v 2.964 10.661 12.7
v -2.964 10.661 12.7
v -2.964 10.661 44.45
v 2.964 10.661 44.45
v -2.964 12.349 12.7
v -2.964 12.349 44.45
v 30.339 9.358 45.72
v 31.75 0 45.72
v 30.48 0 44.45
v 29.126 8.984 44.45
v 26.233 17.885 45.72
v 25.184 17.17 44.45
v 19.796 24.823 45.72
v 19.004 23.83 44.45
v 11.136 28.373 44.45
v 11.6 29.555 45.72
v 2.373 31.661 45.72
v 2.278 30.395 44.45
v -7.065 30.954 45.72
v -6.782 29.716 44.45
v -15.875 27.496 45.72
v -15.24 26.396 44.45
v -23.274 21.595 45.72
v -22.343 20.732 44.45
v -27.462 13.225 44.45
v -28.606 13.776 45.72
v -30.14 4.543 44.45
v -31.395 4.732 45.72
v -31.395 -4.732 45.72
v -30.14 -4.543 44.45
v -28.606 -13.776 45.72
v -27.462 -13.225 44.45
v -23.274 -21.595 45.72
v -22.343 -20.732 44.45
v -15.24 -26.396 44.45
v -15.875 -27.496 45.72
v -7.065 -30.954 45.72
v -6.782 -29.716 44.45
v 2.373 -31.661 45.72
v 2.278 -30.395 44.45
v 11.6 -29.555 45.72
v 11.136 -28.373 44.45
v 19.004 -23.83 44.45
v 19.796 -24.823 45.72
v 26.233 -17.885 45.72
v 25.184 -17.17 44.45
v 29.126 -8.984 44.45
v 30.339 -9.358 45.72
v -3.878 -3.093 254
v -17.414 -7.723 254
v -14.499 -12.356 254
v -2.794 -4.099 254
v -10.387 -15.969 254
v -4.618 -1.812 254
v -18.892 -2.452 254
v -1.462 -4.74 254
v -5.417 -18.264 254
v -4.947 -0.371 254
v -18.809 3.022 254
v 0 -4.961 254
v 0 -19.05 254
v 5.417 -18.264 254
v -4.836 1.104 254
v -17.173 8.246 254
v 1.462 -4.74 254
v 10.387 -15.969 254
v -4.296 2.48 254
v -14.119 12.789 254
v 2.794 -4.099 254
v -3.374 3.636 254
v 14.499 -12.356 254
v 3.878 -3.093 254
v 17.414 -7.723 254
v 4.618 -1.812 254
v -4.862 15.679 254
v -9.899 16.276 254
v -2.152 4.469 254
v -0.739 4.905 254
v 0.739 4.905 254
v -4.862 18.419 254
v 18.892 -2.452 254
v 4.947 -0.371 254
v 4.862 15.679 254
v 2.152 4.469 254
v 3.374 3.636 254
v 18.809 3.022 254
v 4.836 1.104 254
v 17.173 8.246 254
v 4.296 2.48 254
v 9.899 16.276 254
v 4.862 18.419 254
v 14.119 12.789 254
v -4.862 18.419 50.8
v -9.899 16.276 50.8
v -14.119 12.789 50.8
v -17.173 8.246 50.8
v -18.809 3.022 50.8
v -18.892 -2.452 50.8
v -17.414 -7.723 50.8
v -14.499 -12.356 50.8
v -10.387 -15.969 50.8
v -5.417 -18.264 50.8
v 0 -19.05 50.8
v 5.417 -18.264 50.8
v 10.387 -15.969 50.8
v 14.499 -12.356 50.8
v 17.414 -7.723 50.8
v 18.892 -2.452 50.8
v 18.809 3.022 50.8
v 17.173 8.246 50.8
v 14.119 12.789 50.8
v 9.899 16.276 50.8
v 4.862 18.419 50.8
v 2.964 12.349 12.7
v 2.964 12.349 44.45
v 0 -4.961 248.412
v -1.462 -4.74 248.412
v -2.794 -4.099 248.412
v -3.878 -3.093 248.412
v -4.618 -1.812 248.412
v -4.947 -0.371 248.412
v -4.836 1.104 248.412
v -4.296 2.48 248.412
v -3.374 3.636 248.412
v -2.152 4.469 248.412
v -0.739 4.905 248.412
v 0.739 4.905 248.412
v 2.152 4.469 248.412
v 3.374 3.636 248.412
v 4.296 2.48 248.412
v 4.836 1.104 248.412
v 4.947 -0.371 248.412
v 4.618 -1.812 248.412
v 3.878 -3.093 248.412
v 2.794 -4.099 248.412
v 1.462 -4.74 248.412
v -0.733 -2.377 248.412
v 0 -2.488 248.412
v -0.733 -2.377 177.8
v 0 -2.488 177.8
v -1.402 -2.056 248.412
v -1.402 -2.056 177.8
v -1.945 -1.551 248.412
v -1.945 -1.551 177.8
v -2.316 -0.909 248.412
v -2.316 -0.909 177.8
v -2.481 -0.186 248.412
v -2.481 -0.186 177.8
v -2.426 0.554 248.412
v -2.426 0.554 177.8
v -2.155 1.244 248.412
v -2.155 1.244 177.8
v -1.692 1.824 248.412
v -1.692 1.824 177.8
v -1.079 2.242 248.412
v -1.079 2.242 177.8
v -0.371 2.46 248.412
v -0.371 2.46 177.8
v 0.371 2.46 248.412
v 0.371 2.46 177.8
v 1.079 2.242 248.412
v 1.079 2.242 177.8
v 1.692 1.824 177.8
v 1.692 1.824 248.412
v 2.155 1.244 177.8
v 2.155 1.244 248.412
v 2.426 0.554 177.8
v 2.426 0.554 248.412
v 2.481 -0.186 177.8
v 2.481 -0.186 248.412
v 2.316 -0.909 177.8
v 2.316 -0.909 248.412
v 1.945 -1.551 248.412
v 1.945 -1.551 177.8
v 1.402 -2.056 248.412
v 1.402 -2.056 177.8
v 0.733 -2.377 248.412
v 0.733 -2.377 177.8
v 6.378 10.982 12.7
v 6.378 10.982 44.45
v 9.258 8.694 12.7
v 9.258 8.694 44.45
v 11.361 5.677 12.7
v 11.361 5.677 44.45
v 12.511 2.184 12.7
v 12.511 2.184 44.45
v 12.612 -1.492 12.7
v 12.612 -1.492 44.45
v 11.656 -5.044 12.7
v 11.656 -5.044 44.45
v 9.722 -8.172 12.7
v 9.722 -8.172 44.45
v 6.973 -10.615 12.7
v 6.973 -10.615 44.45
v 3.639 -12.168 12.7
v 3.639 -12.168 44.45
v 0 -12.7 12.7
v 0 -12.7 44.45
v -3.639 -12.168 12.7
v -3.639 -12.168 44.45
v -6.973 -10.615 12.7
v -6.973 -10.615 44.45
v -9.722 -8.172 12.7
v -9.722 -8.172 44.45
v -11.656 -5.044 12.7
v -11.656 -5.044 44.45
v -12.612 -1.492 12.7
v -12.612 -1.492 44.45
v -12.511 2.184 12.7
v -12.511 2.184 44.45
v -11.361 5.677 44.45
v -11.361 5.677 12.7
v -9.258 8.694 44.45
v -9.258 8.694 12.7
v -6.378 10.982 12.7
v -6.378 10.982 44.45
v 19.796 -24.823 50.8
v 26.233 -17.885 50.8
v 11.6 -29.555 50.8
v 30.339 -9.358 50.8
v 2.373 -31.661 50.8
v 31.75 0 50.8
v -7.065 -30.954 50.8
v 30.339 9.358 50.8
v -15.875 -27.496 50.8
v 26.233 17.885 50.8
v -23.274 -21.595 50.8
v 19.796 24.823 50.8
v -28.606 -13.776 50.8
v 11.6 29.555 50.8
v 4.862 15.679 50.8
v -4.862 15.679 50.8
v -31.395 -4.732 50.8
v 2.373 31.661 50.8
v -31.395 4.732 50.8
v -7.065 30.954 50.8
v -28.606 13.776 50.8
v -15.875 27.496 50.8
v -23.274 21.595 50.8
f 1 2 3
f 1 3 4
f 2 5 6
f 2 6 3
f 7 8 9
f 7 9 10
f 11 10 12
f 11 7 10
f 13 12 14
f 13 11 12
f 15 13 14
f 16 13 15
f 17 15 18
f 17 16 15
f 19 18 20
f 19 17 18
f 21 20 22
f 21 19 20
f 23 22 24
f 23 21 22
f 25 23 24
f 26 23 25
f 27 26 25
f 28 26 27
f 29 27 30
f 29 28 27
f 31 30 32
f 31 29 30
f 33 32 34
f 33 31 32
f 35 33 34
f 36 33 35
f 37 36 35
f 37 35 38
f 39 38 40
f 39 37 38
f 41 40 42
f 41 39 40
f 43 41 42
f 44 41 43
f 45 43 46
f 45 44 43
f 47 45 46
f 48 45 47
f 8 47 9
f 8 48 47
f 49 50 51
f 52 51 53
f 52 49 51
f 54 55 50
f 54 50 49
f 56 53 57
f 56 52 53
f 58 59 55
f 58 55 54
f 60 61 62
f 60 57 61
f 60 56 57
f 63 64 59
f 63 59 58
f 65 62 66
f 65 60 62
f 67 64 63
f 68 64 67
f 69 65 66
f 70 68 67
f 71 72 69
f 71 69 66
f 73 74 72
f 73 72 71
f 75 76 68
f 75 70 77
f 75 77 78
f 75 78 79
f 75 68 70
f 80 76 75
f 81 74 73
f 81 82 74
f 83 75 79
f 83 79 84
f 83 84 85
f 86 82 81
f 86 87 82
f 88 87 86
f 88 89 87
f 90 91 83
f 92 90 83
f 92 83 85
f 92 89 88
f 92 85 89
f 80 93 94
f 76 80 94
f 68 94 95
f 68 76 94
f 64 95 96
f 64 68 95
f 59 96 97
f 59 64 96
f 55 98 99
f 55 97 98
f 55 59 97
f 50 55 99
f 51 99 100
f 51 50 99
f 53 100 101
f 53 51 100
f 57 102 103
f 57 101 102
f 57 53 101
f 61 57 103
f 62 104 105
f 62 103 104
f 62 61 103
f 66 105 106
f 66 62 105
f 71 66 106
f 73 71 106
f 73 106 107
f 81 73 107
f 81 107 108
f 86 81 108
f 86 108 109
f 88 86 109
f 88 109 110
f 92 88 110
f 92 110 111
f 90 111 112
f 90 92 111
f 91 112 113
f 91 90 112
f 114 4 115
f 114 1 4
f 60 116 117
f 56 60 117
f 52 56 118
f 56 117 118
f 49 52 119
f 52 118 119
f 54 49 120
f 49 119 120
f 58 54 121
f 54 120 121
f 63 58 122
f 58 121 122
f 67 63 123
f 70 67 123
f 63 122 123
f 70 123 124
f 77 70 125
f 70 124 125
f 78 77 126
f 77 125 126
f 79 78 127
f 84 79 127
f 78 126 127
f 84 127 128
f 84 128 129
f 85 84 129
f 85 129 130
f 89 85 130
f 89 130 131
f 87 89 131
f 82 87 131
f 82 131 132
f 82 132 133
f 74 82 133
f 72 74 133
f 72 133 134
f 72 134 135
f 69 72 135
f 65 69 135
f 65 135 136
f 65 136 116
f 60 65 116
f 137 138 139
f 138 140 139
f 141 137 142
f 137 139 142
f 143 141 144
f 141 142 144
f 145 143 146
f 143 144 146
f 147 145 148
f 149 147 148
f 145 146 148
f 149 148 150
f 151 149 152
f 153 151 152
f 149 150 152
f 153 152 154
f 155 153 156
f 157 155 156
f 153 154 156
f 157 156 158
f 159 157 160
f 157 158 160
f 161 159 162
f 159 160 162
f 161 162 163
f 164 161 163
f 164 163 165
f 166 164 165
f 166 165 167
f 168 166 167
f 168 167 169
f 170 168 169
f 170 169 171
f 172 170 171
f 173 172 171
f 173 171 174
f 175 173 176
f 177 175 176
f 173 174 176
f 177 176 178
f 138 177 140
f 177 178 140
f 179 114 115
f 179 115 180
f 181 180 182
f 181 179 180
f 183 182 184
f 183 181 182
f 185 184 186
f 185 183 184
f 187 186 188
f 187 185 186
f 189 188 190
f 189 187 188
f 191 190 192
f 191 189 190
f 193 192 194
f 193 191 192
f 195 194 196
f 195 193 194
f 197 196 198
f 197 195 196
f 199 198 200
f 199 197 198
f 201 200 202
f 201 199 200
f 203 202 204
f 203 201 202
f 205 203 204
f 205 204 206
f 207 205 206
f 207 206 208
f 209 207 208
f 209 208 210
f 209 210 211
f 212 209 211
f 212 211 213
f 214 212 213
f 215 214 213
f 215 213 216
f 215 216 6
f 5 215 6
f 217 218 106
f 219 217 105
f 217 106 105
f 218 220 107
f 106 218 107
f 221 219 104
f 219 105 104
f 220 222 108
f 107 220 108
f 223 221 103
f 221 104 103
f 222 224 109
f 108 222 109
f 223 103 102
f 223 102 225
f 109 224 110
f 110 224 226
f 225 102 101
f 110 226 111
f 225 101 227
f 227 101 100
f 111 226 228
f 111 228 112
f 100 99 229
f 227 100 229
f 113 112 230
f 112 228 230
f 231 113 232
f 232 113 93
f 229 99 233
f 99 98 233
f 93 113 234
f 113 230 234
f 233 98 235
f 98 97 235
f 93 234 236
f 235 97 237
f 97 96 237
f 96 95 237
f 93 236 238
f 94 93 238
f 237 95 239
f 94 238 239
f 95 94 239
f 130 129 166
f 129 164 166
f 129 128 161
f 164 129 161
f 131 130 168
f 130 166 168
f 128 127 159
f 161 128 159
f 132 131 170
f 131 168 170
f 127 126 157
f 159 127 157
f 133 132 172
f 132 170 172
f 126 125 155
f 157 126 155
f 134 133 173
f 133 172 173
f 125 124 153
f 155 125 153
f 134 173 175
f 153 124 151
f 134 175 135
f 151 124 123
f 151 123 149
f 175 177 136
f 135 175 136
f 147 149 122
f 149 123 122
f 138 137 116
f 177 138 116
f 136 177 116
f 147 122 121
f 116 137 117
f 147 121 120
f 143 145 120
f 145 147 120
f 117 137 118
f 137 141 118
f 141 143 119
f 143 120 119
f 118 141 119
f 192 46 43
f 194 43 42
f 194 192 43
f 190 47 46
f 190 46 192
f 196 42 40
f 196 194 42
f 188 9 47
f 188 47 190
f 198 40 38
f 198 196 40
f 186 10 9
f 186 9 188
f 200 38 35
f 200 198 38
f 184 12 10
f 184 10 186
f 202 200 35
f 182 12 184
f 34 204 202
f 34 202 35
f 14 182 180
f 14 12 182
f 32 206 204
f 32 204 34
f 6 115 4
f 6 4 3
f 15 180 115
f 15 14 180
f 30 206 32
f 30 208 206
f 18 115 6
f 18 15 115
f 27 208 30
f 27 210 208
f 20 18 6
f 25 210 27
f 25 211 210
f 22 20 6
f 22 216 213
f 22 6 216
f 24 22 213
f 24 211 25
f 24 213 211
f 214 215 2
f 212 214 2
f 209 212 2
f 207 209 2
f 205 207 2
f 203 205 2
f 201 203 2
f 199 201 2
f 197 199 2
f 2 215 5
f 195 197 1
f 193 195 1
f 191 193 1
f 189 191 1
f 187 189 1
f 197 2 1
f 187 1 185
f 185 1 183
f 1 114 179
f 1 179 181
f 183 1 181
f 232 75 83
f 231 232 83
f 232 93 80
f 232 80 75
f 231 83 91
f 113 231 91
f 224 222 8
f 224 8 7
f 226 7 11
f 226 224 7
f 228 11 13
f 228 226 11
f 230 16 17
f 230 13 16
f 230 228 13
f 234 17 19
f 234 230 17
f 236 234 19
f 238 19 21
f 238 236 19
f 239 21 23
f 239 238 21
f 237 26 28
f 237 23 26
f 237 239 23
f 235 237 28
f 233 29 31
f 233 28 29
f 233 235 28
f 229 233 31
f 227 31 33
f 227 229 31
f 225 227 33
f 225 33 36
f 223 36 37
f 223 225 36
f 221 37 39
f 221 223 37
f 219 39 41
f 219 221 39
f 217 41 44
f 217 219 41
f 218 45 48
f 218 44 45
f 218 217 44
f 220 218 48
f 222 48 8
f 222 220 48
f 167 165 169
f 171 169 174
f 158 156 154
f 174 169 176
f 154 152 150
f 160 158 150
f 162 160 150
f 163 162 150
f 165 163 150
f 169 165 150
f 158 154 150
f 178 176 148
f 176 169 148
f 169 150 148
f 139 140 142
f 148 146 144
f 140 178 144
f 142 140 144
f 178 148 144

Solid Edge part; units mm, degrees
sketch "Sketch1" plane through (0, 0, 0) normal (0, 0, 1) x (1, 0, 0)
  circle A0 centre (0, 0) radius 12.7
extrude "Protrusion1" add sketch "Sketch1" along normal blind 254
sketch "Sketch2" plane through (0, 0, 254) normal (0, 0, 1) x (1, 0, 0)
  circle A0 centre (0, 0) radius 19.05
extrude "ExtrudedProtrusion_2" add sketch "Sketch2" against normal blind 203.2
sketch "Sketch3" plane through (0, 0, 0) normal (0, 0, -1) x (-1, 0, 0)
  line L0 (-2.9642, 14.7392) -> (2.9642, 14.7392)
  line L1 (2.9642, 14.7392) -> (2.9642, 10.6608)
  line L2 (2.9642, 10.6608) -> (-2.9642, 10.6608)
  line L3 (-2.9642, 10.6608) -> (-2.9642, 14.7392)
extrude "ExtrudedCutout_1" cut sketch "Sketch3" against normal blind 50.8
sketch "Sketch4" plane through (0, 0, 50.8) normal (0, 0, -1) x (-1, 0, 0)
  line L0 (-4.8624, 22.4209) -> (4.8624, 22.4209)
  line L1 (4.8624, 22.4209) -> (4.8624, 15.6791)
  line L2 (4.8624, 15.6791) -> (-4.8624, 15.6791)
  line L3 (-4.8624, 15.6791) -> (-4.8624, 22.4209)
extrude "ExtrudedCutout_2" cut sketch "Sketch4" against normal blind 224.5097
sketch "Sketch5" plane through (0, -0.3155, 50.8) normal (0, 0, -1) x (1, 0, 0)
  circle A0 centre (0, -0.3155) radius 31.75
extrude "ExtrudedProtrusion_3" add sketch "Sketch5" along normal blind 6.35
chamfer "Chamfer_1" distance 1.27 angle 45 1 edges at (-31.75, 0, 44.45)
hole "Hole_1" at (0, 0, 254) direction (0, 0, -1) diameter 4.9759 depth 76.2 counterbore diameter 9.9212 counterbore depth 5.588 thread major 6.35 thread length 50.8
sketch "Sketch6" plane through (0, 0, 0) normal (0, 0, 1) x (1, 0, 0)
  circle A0 centre (0, 0) radius 12.7
extrude "ExtrudedCutout_3" cut sketch "Sketch6" along normal blind 12.7
